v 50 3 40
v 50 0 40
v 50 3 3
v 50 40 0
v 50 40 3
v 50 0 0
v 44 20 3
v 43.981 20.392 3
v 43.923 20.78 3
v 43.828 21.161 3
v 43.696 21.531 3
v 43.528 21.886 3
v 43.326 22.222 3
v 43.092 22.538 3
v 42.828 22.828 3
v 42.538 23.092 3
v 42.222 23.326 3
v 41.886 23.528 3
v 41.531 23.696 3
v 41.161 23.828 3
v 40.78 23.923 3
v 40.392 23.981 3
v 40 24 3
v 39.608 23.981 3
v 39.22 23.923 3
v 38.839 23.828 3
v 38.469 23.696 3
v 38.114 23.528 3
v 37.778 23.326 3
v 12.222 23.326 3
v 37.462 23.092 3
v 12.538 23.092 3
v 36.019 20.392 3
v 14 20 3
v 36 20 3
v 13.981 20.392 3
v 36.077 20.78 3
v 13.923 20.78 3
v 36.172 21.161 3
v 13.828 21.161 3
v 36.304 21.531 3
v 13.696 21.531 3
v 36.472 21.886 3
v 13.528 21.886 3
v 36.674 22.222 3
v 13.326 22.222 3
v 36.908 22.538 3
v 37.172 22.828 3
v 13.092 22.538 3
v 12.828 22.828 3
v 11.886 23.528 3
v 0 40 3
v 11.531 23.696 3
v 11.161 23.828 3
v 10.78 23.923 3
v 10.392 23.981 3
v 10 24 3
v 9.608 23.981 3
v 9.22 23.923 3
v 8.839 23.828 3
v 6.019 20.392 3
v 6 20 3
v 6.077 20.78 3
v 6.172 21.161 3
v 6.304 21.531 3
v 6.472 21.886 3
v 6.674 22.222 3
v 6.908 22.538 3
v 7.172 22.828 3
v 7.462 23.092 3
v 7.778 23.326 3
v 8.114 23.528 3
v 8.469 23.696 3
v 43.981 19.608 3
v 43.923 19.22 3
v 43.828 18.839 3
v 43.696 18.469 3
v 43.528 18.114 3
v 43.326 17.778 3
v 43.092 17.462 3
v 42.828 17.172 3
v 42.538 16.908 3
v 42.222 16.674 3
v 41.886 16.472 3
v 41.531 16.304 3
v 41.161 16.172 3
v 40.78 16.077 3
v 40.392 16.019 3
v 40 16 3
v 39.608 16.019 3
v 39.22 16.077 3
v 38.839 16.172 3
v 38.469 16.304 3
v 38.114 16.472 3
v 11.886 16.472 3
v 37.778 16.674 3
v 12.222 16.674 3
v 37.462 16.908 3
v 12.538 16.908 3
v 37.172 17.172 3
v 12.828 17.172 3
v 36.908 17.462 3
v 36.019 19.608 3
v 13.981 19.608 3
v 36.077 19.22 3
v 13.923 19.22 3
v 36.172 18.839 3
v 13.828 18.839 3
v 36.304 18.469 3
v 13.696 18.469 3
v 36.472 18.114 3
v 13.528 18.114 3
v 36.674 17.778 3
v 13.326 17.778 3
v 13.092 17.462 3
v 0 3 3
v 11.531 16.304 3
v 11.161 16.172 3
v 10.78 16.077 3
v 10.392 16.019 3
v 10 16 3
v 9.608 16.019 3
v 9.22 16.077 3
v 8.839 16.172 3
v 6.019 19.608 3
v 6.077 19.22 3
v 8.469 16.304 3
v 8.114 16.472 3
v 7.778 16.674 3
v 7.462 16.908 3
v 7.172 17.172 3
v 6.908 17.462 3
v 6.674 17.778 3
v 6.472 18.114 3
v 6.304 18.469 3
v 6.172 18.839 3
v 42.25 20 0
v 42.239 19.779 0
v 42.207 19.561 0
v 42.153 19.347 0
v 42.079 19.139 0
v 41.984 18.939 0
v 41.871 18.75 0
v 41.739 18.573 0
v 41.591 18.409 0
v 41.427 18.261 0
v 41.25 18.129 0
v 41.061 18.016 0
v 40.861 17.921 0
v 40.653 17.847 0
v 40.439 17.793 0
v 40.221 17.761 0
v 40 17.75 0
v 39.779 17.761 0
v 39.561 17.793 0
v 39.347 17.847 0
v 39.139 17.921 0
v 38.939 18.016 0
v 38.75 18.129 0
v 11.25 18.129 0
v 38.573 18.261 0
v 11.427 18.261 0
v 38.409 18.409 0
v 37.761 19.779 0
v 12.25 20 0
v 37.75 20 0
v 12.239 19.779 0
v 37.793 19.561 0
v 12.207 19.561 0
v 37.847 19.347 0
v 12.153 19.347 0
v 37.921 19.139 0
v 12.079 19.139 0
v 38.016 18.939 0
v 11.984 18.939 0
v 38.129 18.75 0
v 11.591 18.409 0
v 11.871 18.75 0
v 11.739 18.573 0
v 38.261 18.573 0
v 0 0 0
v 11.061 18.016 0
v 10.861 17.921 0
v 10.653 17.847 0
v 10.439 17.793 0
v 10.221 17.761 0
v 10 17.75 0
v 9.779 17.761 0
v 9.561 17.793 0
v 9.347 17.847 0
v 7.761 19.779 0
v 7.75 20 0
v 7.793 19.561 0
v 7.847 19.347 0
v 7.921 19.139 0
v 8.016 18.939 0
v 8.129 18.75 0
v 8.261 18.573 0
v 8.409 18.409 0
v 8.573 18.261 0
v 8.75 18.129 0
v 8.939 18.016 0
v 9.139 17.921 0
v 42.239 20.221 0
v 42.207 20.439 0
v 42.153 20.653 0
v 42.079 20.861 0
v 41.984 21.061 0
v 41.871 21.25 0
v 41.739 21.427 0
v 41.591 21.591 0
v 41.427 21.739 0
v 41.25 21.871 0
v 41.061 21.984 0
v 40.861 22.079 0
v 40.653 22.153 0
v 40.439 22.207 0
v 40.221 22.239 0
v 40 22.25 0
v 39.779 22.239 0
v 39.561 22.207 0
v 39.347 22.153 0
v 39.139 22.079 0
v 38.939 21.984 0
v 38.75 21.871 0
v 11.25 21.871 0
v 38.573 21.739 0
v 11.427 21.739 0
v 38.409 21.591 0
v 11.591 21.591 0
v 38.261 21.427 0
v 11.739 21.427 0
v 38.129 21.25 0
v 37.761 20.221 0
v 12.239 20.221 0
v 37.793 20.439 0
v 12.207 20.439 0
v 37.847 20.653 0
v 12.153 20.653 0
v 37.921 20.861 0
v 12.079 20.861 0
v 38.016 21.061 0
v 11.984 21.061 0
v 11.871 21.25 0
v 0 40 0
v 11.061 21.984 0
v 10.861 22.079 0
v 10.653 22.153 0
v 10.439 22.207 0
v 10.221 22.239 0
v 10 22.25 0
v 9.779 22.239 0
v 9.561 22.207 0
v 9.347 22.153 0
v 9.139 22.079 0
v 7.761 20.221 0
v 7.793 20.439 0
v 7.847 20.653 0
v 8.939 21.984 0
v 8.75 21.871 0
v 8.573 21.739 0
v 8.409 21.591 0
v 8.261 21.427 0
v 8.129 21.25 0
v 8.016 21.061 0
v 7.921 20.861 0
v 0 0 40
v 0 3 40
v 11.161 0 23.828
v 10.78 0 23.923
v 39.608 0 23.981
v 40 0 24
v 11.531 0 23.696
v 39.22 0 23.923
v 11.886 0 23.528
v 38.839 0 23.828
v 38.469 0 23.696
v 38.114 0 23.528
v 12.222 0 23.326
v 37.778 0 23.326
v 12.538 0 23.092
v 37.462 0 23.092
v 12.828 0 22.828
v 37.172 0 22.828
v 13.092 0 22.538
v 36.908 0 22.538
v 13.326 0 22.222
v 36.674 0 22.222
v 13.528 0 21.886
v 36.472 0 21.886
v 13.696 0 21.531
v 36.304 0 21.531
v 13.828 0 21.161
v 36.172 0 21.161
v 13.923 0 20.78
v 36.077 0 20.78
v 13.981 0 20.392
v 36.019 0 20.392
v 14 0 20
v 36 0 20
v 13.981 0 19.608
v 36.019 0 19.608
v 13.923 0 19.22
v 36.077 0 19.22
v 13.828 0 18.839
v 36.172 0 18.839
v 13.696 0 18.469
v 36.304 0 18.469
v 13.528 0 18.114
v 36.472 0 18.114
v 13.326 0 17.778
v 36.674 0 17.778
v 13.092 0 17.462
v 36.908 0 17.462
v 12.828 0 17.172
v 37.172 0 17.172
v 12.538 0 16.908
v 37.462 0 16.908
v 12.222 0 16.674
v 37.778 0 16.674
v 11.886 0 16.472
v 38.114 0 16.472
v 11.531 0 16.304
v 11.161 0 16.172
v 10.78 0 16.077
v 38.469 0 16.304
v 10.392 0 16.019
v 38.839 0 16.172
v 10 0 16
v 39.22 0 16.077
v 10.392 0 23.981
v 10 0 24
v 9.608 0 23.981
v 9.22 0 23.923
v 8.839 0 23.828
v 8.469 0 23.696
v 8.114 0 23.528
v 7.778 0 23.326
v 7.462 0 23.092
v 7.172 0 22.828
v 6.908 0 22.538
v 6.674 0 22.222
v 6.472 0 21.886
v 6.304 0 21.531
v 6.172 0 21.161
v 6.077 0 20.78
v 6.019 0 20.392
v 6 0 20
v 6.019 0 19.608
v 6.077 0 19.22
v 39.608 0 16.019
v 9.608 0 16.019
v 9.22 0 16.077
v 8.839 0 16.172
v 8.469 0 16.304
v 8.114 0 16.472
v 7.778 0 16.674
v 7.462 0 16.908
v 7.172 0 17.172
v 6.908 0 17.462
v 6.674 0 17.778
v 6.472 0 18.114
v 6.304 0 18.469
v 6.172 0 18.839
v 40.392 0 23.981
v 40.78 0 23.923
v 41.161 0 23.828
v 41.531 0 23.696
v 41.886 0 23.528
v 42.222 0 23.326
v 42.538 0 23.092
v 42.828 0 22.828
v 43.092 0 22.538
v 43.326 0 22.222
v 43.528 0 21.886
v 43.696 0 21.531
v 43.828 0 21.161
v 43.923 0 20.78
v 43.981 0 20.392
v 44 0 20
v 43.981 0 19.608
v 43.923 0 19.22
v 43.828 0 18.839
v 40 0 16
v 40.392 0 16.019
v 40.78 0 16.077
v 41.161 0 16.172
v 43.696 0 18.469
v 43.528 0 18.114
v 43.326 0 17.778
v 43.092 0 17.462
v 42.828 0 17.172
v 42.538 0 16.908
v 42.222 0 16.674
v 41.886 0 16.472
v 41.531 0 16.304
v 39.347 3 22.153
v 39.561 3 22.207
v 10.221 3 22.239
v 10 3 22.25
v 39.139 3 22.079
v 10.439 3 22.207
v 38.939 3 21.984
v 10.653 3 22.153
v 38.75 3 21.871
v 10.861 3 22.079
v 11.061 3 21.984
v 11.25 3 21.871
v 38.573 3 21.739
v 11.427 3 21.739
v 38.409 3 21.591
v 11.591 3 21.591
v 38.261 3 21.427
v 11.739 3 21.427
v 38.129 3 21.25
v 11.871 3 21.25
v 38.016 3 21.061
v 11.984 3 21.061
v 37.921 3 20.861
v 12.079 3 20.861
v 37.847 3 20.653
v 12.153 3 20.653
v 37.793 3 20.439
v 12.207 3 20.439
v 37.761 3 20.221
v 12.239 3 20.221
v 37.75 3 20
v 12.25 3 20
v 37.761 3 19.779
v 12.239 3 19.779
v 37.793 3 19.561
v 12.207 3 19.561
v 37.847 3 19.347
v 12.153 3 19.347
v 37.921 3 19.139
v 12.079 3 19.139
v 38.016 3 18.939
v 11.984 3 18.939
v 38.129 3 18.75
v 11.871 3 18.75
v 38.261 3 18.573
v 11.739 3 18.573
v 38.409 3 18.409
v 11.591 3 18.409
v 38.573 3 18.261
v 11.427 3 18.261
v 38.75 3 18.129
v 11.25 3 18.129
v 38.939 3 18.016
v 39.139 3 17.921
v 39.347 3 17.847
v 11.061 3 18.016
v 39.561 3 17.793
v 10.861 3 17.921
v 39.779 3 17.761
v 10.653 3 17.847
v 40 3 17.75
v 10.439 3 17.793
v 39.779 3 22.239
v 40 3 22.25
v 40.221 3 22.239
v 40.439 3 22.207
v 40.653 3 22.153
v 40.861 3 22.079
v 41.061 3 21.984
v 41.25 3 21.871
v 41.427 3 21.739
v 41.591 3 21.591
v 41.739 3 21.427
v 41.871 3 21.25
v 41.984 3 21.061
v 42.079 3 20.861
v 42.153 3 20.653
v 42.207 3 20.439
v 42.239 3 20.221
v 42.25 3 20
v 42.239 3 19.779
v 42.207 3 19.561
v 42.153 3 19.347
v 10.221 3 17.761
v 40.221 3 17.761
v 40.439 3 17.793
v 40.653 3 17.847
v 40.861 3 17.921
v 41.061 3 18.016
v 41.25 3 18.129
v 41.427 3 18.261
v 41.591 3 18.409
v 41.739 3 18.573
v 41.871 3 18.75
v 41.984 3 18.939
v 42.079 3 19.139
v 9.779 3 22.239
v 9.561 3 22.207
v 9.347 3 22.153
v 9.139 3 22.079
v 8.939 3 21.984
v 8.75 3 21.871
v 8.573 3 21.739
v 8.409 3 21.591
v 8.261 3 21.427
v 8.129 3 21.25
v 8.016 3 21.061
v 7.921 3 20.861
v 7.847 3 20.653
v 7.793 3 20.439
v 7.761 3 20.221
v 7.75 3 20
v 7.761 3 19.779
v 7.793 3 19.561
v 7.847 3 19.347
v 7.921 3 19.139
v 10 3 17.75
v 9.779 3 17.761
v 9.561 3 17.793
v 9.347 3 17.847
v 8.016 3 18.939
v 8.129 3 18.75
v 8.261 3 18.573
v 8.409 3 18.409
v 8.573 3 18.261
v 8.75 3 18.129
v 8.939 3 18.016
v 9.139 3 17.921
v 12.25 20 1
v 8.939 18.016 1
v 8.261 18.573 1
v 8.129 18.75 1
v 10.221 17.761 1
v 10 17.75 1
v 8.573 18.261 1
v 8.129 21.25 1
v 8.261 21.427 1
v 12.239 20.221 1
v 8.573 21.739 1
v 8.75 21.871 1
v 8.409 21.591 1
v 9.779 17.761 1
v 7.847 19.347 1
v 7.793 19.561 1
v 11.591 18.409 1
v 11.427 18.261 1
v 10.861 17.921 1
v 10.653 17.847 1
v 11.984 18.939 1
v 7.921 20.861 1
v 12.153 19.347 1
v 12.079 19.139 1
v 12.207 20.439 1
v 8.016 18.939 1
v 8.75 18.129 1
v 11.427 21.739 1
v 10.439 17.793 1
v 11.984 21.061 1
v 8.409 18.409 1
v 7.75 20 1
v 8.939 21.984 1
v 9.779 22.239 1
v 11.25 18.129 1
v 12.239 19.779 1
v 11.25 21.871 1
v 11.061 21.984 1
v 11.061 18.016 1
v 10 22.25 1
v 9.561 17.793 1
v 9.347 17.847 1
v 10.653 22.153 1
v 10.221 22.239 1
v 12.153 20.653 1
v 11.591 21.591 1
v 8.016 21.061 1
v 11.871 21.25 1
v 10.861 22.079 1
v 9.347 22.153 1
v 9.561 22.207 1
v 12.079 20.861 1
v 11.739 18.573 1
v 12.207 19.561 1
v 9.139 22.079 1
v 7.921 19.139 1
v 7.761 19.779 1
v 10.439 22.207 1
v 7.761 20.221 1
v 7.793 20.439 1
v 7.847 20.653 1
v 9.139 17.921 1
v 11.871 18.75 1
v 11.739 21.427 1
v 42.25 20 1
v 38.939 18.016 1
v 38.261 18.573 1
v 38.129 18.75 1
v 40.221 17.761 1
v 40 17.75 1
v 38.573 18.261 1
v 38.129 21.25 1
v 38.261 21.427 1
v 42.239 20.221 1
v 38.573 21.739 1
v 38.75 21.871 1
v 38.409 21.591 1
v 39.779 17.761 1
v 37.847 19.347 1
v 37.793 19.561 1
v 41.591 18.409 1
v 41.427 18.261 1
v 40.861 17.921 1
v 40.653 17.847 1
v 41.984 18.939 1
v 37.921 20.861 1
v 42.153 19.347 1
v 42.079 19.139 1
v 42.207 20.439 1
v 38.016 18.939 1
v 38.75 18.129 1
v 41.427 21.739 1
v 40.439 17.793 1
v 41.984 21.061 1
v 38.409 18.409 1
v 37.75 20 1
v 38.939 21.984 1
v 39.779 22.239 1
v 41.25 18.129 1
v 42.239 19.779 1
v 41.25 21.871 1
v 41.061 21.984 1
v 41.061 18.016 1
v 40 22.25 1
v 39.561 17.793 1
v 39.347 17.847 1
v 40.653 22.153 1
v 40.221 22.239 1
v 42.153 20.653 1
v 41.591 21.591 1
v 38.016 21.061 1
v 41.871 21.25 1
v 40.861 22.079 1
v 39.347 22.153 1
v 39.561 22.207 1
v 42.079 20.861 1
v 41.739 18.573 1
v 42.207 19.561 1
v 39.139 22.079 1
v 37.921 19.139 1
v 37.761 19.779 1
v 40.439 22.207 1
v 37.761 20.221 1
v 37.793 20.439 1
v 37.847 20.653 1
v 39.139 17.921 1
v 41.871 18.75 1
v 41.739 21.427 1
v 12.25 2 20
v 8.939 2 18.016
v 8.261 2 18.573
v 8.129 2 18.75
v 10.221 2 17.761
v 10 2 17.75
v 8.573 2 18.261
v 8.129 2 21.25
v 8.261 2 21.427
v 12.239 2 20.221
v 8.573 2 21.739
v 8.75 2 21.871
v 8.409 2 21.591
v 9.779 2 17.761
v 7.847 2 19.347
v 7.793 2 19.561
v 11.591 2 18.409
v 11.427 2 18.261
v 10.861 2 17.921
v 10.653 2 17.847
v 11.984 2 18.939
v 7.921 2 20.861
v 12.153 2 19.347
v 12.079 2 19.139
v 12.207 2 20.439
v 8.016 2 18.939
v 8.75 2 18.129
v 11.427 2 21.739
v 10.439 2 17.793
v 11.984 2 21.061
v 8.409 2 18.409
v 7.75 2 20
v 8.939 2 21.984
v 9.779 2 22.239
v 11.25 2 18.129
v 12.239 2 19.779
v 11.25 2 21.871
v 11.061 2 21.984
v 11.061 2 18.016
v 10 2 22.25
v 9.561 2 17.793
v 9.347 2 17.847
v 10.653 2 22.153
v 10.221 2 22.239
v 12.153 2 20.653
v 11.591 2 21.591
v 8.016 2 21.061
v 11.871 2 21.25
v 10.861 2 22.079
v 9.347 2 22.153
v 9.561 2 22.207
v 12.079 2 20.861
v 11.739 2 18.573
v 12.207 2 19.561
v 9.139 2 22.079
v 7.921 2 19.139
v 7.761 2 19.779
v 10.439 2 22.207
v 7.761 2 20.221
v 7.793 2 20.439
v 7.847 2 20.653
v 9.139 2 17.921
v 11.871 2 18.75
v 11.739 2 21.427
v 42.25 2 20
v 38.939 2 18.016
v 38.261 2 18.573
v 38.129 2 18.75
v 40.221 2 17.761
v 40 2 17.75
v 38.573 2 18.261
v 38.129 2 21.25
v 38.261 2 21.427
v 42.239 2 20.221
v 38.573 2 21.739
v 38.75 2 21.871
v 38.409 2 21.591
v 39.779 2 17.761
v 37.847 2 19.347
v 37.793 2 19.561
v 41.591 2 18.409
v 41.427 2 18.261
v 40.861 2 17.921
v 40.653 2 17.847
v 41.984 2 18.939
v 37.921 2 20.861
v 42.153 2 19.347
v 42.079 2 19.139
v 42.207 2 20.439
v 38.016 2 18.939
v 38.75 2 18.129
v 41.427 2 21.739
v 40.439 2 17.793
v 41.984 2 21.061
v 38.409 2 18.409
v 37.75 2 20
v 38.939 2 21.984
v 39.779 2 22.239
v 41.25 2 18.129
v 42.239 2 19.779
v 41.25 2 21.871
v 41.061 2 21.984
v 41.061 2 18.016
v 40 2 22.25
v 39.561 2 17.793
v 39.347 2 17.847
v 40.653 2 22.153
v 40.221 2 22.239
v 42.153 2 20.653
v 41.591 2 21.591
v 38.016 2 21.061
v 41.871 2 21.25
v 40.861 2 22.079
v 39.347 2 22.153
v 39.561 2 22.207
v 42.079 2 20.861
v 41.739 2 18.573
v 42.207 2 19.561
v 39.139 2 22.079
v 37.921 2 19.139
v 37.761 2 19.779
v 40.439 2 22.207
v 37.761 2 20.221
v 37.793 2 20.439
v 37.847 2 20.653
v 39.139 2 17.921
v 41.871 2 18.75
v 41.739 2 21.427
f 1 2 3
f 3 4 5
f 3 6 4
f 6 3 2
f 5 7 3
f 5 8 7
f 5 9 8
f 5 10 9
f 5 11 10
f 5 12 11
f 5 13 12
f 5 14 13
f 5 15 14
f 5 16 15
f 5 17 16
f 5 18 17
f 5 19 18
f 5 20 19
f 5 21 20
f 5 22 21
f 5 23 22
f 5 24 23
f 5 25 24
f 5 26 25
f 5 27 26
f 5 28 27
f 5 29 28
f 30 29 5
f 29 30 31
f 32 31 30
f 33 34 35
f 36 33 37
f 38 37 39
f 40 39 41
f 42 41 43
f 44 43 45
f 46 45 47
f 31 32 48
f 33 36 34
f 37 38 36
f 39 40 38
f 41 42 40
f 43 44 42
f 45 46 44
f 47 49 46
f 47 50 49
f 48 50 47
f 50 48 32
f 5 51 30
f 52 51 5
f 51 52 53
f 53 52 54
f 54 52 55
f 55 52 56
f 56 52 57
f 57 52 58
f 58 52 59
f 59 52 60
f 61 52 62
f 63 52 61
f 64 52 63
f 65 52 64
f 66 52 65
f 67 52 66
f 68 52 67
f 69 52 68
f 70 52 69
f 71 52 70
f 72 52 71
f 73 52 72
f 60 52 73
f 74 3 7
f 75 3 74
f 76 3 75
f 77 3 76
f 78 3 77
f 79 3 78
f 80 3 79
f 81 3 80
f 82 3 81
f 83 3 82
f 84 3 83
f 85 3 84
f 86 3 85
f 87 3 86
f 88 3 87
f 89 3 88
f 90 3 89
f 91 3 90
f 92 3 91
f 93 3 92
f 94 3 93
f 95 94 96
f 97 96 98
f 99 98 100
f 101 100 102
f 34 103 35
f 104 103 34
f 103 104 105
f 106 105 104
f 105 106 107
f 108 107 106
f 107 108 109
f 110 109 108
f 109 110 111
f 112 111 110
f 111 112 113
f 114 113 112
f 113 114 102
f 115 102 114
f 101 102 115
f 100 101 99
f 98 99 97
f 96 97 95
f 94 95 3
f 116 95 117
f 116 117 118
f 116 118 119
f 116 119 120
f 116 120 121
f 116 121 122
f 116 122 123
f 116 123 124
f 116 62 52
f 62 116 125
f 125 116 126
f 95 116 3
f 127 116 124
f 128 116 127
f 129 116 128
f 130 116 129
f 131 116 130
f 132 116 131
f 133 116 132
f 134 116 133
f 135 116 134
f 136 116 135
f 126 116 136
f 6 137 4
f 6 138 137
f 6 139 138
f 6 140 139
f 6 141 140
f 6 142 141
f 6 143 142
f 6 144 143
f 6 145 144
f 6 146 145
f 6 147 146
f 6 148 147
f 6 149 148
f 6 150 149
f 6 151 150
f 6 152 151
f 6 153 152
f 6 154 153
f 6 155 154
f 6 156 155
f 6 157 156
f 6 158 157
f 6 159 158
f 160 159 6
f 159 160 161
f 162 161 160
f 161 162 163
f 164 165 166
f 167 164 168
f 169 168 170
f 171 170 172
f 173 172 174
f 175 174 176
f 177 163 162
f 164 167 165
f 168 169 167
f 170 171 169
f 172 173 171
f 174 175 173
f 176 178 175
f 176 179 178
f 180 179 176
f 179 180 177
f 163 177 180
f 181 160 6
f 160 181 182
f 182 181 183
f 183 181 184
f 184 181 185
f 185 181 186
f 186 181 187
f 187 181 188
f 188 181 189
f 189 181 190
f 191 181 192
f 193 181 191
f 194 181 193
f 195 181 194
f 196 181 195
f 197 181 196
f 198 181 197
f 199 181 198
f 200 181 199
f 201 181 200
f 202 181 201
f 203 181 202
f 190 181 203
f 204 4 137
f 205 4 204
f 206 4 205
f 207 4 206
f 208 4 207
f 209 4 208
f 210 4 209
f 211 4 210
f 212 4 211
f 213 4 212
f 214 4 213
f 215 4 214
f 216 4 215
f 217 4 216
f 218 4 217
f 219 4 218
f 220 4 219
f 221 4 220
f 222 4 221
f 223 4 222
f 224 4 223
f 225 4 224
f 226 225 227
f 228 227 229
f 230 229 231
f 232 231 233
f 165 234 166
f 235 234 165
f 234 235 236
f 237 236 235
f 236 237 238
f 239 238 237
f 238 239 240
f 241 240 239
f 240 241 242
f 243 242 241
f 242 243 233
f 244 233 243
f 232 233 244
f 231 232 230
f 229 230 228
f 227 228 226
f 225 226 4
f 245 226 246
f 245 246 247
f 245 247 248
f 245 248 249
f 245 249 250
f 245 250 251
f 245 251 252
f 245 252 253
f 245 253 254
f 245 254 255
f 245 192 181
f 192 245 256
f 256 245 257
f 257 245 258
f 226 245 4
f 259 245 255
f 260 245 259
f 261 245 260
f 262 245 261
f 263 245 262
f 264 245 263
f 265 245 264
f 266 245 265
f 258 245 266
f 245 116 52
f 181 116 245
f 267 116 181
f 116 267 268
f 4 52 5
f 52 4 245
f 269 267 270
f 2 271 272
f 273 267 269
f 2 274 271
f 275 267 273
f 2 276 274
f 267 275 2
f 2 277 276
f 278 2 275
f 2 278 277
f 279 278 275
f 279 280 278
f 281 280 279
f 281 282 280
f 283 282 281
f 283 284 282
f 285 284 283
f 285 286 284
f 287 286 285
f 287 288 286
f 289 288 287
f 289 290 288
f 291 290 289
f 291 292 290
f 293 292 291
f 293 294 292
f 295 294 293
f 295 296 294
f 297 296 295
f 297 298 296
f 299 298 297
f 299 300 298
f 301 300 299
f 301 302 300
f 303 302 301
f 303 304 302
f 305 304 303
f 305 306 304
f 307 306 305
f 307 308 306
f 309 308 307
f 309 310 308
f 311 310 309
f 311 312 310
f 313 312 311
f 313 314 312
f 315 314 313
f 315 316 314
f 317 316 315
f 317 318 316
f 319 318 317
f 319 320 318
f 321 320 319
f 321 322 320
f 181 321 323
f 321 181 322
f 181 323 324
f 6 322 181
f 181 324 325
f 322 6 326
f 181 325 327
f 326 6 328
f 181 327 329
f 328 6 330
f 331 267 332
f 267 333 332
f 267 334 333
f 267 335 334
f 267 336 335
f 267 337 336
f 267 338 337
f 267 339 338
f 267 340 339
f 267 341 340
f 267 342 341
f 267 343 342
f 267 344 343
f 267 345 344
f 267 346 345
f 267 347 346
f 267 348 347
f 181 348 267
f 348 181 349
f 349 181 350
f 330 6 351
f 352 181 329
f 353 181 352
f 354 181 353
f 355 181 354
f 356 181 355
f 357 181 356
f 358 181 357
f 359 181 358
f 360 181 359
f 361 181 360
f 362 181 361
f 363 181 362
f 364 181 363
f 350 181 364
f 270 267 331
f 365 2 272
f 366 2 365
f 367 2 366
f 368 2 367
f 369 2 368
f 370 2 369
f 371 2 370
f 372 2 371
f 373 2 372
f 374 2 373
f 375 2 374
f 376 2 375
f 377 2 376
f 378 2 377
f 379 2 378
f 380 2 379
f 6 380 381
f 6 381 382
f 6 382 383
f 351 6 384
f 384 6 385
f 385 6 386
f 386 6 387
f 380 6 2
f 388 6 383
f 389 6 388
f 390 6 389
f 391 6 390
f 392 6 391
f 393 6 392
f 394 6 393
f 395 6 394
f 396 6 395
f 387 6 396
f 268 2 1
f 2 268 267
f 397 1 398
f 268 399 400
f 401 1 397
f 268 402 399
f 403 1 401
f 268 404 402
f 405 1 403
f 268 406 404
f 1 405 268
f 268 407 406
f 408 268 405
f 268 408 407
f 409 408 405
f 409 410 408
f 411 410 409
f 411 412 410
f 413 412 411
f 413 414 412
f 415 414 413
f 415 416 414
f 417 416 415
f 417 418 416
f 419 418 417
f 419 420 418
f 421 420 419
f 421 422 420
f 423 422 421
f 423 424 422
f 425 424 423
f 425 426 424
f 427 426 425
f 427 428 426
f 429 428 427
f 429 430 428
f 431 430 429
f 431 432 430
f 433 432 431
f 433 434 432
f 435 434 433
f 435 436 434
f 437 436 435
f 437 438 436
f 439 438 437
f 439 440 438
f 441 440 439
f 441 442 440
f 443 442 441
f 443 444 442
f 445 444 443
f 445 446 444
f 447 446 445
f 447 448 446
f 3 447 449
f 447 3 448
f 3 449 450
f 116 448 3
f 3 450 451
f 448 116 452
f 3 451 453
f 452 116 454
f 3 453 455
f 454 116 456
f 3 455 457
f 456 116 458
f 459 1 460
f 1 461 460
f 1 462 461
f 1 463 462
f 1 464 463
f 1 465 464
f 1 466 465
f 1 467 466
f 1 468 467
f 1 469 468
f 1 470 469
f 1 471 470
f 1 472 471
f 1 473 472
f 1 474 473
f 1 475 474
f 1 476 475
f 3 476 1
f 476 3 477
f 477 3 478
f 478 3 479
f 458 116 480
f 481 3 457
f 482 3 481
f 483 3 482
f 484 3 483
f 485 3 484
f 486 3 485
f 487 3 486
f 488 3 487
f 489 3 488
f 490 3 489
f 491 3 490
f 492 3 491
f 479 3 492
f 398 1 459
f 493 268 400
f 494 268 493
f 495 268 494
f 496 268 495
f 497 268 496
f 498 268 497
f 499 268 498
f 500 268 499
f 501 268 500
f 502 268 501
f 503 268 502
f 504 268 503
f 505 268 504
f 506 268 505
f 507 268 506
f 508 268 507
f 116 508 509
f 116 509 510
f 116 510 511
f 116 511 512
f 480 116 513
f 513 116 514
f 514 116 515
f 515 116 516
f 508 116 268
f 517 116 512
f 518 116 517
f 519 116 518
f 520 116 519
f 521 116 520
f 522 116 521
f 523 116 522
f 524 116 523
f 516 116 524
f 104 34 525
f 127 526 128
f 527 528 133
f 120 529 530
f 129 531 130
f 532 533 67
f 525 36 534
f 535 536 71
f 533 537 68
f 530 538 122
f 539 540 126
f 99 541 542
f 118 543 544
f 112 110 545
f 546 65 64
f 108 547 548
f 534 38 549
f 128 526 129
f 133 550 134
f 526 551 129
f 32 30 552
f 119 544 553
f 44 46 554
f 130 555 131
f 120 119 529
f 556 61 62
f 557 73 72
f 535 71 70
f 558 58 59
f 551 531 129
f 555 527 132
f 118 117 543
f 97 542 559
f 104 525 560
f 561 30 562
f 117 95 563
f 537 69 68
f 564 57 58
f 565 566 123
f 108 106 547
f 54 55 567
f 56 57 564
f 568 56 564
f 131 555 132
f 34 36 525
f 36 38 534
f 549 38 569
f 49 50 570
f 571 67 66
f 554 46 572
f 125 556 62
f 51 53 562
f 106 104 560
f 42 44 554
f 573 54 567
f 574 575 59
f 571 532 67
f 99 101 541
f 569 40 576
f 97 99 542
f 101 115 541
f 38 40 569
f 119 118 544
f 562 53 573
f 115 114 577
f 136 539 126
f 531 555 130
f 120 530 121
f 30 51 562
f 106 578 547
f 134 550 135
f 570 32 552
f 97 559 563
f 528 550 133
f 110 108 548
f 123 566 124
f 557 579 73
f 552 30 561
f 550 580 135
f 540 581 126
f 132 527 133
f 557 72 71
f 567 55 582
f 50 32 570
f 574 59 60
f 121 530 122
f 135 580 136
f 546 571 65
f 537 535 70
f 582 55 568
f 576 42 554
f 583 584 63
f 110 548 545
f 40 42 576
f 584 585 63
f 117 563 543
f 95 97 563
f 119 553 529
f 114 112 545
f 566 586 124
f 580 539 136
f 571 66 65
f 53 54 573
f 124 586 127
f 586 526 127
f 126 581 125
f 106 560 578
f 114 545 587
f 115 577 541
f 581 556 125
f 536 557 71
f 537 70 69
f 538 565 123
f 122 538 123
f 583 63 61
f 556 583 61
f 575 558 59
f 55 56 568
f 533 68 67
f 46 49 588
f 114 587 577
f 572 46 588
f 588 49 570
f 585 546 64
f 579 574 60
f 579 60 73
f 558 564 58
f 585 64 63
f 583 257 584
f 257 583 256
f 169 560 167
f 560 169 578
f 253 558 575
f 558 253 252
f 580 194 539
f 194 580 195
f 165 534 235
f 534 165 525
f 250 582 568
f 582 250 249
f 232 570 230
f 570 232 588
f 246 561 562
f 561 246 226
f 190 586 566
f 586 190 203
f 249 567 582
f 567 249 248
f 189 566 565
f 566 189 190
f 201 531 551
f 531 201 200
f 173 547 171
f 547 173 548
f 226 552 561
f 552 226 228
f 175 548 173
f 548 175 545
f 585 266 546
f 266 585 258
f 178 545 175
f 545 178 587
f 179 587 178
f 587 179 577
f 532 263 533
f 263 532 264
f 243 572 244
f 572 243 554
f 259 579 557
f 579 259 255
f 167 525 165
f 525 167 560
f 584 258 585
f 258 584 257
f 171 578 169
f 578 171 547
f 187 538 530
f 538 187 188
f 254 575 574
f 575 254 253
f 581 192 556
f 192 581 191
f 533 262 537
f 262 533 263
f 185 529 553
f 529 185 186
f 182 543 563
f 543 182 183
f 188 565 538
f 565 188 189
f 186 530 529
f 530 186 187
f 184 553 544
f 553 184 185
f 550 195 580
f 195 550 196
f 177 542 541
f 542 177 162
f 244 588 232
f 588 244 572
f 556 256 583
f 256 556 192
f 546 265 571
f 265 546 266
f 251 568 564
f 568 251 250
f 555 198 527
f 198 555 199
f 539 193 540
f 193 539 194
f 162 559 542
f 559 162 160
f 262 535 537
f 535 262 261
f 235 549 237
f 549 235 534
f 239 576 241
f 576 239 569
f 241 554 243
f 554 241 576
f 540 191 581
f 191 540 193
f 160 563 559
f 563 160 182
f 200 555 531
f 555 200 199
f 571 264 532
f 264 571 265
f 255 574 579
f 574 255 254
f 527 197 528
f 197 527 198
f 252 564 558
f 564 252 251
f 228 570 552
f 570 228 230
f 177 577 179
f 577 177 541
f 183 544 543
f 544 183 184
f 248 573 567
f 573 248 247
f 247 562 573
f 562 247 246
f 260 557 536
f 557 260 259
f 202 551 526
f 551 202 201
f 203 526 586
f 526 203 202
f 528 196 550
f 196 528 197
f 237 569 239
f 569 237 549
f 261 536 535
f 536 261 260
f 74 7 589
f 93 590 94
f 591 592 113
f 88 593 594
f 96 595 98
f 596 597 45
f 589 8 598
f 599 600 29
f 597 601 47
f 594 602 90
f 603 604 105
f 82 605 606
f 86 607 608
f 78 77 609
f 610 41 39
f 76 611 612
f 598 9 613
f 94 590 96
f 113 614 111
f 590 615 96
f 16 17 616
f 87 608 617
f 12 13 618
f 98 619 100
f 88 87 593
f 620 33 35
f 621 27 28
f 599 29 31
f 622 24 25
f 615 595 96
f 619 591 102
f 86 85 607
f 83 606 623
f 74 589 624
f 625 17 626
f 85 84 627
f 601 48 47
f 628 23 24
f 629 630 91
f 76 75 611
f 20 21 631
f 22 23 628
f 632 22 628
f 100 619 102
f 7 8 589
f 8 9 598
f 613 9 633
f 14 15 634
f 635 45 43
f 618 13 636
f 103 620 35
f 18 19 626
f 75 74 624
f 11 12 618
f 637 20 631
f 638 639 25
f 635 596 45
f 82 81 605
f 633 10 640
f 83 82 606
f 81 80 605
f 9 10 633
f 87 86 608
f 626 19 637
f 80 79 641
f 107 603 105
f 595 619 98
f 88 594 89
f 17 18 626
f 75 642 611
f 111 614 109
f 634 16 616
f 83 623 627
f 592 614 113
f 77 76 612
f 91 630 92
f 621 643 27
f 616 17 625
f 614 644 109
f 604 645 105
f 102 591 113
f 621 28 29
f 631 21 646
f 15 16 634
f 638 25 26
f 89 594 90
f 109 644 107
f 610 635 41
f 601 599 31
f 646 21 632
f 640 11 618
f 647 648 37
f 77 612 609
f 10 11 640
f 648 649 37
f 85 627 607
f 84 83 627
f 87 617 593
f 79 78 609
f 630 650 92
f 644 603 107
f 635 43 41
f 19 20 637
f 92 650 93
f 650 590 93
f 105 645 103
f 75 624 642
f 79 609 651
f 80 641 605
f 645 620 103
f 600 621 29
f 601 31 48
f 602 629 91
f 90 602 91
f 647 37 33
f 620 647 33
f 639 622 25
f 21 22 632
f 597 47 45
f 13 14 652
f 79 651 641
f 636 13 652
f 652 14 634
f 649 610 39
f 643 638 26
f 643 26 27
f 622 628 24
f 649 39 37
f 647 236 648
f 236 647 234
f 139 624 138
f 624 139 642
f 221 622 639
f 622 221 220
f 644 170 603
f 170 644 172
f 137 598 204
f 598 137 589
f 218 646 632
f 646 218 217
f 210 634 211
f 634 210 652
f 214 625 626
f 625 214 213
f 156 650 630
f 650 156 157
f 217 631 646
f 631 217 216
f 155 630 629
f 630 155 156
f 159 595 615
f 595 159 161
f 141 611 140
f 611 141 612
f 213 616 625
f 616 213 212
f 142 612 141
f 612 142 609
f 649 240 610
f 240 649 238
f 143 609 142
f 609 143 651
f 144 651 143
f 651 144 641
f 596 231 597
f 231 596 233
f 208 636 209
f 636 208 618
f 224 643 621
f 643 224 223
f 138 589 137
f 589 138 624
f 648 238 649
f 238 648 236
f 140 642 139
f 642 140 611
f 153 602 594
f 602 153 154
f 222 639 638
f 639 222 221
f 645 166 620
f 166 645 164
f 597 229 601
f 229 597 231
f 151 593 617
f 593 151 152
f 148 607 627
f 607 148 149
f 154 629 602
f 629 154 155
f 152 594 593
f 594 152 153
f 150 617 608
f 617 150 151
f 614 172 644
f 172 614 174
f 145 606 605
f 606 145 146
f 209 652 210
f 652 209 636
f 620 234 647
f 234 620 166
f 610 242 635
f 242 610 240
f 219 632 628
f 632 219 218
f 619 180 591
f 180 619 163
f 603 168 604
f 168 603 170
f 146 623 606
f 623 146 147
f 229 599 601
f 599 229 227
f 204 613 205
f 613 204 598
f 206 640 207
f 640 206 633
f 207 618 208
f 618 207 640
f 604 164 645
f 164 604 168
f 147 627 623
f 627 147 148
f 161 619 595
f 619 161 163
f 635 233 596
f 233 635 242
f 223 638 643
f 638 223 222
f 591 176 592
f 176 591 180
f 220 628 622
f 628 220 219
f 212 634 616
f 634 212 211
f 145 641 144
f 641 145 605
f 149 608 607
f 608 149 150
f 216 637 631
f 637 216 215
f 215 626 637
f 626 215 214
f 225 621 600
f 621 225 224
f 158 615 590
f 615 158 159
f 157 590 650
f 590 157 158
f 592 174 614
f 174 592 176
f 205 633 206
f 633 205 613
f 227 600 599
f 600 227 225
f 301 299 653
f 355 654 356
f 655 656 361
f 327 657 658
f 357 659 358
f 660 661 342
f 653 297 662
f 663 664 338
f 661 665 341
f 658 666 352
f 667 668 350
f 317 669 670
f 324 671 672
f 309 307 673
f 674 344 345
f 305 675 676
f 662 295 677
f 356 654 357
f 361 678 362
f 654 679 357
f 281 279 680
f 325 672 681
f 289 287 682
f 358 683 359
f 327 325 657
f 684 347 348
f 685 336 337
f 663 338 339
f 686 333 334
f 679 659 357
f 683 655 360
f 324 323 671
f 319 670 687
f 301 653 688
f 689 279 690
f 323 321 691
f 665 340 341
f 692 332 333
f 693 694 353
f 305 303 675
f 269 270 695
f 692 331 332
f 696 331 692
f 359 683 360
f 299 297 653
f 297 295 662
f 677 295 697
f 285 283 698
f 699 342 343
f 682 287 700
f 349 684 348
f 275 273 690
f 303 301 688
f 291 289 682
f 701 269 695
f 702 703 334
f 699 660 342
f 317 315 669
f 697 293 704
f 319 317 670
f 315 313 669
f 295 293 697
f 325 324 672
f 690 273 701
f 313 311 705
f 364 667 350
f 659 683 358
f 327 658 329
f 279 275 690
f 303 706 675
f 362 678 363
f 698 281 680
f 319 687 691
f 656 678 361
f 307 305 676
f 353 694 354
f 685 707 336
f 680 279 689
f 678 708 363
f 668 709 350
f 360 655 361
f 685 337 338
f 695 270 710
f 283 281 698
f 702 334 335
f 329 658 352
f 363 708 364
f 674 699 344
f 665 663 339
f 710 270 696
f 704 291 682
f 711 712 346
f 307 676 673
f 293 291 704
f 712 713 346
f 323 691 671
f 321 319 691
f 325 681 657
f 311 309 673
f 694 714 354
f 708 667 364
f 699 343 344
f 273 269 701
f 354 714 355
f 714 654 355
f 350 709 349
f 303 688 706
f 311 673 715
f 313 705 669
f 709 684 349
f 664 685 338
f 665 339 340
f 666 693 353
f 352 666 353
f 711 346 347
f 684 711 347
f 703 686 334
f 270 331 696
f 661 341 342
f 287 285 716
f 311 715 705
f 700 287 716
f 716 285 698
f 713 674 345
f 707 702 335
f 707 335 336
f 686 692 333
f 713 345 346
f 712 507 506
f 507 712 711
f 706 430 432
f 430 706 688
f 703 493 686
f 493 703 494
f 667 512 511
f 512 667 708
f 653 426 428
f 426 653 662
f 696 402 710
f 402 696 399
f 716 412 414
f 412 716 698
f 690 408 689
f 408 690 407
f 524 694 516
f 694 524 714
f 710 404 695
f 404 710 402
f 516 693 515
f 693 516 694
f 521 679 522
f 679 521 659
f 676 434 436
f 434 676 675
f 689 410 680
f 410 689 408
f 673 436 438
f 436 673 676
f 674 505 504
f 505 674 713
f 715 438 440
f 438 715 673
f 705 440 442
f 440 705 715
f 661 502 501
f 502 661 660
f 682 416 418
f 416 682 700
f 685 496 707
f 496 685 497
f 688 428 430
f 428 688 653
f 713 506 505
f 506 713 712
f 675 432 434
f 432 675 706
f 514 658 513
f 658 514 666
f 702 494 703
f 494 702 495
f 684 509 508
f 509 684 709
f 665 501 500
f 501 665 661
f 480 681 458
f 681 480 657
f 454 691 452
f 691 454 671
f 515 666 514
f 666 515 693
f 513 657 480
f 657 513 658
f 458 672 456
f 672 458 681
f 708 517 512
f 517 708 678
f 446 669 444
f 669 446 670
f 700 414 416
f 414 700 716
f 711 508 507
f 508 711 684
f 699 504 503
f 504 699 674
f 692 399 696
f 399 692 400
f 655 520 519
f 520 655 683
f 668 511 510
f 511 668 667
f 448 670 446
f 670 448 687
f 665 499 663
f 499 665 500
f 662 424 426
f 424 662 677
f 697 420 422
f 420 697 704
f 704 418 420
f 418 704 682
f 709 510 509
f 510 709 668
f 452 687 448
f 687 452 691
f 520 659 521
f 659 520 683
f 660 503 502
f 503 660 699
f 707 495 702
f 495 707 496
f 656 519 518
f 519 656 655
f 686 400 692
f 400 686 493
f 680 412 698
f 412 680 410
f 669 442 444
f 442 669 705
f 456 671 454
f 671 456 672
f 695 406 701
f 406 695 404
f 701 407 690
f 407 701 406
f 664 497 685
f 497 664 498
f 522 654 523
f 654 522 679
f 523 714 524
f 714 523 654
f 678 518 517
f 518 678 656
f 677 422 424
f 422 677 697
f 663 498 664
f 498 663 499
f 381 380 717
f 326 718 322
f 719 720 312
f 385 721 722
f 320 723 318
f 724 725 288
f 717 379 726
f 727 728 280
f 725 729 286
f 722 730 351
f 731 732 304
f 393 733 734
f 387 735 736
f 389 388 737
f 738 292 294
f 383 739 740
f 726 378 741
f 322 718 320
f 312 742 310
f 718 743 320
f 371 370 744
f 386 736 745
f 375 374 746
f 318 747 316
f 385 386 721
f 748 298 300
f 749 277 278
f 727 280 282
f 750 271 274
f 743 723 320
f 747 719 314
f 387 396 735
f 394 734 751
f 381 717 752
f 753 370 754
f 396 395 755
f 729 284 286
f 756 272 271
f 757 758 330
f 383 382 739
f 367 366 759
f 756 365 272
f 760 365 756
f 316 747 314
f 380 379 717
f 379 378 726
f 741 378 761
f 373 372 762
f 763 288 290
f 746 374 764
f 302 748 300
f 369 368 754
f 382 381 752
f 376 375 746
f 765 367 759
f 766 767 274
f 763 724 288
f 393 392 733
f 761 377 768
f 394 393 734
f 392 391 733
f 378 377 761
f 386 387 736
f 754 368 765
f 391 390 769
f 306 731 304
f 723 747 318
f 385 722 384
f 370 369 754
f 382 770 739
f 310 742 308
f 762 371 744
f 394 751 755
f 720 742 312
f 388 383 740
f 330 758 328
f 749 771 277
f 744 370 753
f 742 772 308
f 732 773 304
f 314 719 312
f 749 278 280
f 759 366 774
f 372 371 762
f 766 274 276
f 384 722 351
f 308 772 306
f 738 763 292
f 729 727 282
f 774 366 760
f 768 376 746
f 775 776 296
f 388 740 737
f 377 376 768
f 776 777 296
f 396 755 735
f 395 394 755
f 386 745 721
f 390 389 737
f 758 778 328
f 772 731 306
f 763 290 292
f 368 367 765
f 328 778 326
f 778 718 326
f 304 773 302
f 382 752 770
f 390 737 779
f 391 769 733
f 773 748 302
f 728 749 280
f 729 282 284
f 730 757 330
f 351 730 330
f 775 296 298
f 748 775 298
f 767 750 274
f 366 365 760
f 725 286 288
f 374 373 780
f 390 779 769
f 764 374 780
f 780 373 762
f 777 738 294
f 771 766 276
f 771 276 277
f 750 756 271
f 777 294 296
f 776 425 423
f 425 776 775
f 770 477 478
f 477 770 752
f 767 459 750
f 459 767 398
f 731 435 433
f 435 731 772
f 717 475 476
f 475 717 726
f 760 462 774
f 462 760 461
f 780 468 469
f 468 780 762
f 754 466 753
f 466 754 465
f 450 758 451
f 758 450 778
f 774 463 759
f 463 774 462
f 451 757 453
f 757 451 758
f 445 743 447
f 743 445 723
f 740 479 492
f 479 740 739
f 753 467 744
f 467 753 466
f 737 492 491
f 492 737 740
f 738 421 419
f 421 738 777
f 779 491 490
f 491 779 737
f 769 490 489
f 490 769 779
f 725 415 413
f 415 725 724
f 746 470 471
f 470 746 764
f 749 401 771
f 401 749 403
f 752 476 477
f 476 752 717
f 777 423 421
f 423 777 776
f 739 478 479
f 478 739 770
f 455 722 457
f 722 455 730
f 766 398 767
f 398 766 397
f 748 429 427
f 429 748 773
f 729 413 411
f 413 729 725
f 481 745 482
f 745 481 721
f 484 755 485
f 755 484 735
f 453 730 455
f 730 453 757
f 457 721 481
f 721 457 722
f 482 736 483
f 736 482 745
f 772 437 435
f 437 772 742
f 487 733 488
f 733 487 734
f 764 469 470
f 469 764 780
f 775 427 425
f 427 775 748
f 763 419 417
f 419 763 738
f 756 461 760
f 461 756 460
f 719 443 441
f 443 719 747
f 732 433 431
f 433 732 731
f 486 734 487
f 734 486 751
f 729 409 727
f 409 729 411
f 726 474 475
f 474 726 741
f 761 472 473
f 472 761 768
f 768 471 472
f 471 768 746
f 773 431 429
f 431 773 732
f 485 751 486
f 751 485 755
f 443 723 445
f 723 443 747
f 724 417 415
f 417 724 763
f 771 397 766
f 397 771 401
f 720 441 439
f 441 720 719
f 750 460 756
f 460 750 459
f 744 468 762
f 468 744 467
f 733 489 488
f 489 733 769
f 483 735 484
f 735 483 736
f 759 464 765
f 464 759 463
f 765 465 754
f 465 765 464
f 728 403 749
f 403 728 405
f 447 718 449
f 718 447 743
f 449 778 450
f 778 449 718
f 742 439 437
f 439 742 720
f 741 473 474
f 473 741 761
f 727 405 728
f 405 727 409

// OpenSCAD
// ===============================================
//                Parameters
// ===============================================

// --- Bracket Dimensions ---
width     = 50;  // Width on X-axis
depth     = 40;  // Horizontal flange depth on Y-axis
height    = 40;  // Vertical flange height on Z-axis
thickness = 3;   // Thickness of the flanges

// --- M4 Countersunk Hole Dimensions ---
hole_dia  = 4.5; // Through-hole diameter
cs_dia    = 8;   // Countersink top diameter
cs_depth  = 2;   // Countersink depth

// --- Hole Positioning ---
// X-coordinates for the two holes on each flange
hole_pos_x_list = [10, width - 10]; 
// Y-coordinate for holes on the horizontal flange (centerline)
hole_pos_y = depth / 2;
// Z-coordinate for holes on the vertical flange (centerline)
hole_pos_z = height / 2;

// --- Rendering Quality ---
$fn = 64;


// ===============================================
//           Cutter Module Definition
// ===============================================

// Module to create a reusable countersink cutter shape.
// The cutter is created along the Z-axis.
module countersink_cutter(length) {
    // A small epsilon to ensure clean subtraction
    eps = 0.1;
    
    // Countersink cone (frustum)
    cylinder(h = cs_depth, d1 = cs_dia, d2 = hole_dia);
    
    // Through-hole body
    // This cylinder starts at the same base as the cone (z=0)
    // to ensure they form a single solid for subtraction.
    cylinder(h = length + eps, d = hole_dia);
}


// ===============================================
//                  Model
// ===============================================

difference() {
    
    // 1. Create the main body of the L-bracket
    // The inner corner is at the origin [0, 0, 0].
    union() {
        // Horizontal flange: Extends from origin in +Y direction.
        // Occupies space: x=[0,width], y=[0,depth], z=[0,thickness]
        cube([width, depth, thickness]);
        
        // Vertical flange: Extends from origin in +Z direction.
        // Occupies space: x=[0,width], y=[0,thickness], z=[0,height]
        cube([width, thickness, height]);
    }
    
    // 2. Create and subtract the countersunk holes
    
    // --- Holes on the horizontal flange ---
    // Countersinks are on the outer (top) face, which is the plane z=thickness.
    for (x_pos = hole_pos_x_list) {
        // Move the cutter to the top surface and rotate it to point down (-Z).
        translate([x_pos, hole_pos_y, thickness])
        rotate(a=[180, 0, 0]) {
            countersink_cutter(length = thickness);
        }
    }
    
    // --- Holes on the vertical flange (FIXED) ---
    // Correction: The original model had the countersink on the inner face.
    // The countersink must be on the outer face (the plane at y=0).
    for (x_pos = hole_pos_x_list) {
        // Move the cutter to the outer face (y=0) and rotate it to point inwards (+Y).
        translate([x_pos, 0, hole_pos_z])
        rotate(a=[-90, 0, 0]) {
            countersink_cutter(length = thickness);
        }
    }
}
